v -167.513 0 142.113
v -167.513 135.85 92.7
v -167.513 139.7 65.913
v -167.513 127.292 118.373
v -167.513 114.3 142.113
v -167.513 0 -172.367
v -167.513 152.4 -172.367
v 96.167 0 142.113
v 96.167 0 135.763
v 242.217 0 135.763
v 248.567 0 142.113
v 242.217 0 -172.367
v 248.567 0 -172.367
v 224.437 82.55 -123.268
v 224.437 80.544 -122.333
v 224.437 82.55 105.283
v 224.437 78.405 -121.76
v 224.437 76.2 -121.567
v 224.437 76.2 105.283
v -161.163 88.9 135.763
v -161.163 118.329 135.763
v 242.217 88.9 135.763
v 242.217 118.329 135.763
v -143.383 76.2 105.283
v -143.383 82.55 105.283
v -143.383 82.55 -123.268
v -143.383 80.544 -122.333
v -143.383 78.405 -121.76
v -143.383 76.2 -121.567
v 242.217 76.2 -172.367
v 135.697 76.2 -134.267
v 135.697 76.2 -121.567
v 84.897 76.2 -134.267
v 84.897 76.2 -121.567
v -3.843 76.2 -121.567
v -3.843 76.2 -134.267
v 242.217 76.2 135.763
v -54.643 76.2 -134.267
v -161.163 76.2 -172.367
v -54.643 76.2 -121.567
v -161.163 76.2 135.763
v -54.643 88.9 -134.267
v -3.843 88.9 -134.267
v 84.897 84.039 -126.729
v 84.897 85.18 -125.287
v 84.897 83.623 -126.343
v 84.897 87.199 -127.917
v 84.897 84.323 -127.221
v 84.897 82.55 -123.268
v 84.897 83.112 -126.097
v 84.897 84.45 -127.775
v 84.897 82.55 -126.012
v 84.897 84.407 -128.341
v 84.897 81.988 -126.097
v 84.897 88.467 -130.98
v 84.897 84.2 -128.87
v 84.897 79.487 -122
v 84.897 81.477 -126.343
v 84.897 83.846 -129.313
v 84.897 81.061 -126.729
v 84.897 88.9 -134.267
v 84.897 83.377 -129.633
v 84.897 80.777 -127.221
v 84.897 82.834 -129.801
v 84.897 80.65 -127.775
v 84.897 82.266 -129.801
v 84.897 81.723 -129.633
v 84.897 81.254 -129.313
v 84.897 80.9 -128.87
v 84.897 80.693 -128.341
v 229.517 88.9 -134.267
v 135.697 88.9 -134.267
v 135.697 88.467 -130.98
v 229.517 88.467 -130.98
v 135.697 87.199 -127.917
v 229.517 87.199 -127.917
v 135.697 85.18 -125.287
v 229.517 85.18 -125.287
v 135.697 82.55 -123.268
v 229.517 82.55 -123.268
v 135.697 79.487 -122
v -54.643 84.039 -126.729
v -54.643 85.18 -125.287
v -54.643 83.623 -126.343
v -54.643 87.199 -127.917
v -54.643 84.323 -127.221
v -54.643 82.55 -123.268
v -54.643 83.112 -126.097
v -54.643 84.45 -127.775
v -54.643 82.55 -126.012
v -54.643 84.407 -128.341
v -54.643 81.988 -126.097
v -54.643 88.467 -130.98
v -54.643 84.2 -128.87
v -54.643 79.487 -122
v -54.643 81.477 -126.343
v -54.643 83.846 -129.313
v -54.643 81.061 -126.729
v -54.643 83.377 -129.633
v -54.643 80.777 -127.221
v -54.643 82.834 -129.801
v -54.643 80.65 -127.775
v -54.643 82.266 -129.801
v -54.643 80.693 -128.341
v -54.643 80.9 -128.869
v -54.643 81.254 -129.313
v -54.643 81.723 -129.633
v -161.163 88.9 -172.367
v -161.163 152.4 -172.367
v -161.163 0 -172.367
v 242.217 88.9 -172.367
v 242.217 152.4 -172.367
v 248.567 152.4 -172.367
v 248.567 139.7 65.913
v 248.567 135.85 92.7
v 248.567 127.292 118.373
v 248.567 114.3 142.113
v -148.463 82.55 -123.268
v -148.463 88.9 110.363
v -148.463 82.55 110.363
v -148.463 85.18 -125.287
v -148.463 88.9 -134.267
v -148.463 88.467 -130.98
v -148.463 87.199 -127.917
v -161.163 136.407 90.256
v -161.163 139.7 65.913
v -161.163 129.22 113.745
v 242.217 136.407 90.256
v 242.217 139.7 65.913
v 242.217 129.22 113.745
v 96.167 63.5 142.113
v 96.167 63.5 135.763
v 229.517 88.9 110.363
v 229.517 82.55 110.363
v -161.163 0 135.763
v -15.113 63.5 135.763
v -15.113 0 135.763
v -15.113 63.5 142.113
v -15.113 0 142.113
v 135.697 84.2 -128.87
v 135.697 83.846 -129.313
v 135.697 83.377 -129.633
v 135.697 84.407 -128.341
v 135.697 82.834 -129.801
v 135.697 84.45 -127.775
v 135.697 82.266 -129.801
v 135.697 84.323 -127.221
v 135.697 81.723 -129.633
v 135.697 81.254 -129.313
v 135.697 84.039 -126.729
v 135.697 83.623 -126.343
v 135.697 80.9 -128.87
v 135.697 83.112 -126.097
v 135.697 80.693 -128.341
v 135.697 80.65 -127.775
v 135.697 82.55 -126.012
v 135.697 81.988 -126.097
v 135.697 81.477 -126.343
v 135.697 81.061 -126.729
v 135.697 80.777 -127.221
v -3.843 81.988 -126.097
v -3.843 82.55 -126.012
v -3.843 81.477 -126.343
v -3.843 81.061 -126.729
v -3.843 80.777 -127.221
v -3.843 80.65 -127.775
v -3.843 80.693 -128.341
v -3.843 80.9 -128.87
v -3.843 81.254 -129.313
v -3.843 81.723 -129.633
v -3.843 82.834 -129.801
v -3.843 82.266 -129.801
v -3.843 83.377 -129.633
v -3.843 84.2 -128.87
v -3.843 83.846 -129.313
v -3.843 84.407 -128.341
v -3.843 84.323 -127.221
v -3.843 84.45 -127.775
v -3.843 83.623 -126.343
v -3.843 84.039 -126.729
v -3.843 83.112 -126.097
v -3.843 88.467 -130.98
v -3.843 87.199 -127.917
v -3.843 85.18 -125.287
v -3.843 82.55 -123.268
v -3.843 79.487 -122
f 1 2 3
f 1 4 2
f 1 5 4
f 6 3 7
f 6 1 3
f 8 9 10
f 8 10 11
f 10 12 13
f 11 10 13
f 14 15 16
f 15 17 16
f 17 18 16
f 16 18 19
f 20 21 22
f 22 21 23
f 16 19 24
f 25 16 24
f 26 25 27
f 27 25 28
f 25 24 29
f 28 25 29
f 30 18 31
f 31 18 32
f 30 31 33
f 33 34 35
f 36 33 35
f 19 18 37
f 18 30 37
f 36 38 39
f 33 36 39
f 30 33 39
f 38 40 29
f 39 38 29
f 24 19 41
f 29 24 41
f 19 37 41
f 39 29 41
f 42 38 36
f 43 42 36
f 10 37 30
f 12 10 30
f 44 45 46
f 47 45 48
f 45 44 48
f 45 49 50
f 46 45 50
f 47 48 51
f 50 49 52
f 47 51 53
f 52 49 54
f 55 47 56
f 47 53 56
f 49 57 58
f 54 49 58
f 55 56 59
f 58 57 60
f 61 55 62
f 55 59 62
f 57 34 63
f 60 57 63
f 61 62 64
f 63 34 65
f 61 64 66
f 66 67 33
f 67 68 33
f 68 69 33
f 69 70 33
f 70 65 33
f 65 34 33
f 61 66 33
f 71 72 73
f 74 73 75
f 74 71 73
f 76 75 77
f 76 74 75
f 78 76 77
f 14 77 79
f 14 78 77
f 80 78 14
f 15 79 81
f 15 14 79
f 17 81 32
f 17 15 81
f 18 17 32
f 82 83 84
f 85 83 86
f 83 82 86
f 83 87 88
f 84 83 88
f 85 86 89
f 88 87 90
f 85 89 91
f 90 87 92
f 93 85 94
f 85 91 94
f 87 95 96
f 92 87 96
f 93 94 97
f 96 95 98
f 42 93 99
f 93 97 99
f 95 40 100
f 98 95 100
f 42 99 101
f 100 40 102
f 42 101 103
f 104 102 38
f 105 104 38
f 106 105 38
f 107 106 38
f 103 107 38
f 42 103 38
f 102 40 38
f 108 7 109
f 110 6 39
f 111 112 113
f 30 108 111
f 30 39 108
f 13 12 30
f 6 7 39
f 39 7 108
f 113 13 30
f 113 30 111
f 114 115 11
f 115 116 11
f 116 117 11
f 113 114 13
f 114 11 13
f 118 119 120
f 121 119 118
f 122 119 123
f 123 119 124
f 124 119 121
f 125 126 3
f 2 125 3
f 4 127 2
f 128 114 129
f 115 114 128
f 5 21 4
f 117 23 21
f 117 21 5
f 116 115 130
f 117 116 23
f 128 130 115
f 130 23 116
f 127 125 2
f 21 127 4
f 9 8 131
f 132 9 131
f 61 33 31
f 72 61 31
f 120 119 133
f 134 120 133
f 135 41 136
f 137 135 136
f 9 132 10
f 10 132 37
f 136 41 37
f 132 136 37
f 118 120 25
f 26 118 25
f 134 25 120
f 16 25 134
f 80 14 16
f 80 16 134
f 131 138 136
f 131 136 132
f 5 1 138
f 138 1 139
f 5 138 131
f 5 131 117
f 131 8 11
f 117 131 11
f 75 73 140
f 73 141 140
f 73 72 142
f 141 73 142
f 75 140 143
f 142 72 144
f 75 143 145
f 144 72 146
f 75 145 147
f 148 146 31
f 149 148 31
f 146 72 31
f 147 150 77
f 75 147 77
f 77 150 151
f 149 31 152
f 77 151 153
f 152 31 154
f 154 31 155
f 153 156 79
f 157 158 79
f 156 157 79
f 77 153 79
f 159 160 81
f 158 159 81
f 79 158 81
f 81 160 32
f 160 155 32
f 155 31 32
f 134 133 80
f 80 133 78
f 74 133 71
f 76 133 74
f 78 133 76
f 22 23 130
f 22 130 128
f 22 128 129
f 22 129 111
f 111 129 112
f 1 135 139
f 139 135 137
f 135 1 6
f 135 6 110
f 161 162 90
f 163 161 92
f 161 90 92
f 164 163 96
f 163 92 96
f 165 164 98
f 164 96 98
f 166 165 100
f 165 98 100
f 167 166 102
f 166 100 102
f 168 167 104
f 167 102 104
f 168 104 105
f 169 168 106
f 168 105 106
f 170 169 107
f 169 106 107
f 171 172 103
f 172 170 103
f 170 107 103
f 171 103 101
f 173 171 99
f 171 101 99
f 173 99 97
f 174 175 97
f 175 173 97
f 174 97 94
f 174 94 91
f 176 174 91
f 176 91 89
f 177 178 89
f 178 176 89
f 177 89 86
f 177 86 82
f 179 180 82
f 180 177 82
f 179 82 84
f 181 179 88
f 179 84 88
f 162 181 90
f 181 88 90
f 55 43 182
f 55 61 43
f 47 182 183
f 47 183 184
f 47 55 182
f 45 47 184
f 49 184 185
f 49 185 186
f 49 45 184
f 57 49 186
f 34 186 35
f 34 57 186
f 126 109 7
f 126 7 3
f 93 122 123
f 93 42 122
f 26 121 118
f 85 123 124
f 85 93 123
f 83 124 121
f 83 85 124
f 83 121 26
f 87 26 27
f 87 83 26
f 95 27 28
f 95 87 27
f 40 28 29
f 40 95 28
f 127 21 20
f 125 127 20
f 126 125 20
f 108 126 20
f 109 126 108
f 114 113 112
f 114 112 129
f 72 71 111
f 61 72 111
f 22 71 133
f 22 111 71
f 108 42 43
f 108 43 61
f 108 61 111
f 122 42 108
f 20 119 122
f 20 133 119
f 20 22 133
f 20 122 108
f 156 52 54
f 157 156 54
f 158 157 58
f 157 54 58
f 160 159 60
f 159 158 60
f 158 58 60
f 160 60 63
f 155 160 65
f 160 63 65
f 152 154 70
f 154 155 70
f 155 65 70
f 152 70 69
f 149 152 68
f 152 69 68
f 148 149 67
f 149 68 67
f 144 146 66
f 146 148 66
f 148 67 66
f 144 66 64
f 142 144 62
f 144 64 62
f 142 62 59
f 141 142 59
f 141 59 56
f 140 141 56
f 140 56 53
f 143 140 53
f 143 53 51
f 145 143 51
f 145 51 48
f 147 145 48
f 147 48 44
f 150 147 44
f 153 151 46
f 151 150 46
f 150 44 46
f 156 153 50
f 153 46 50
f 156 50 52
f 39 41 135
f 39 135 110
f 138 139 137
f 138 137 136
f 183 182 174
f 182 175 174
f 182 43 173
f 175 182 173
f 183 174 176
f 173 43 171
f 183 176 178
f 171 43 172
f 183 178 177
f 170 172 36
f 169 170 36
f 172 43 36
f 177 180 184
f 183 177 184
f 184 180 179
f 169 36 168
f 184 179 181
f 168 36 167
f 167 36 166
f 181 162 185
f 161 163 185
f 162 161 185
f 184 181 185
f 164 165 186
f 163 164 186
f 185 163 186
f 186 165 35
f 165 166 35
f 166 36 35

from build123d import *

# Parameters (mm, degrees)
SKETCH1_W               = 416.08
SKETCH1_H               = 314.48
BOSS_EXTRUDE2_DEPTH     = 152.4
SKETCH2_W               = 403.38
SKETCH2_H               = 308.13
CUT_EXTRUDE1_DEPTH      = 339.705913999
CUT_EXTRUDE2_DEPTH      = 476.456316699
CUT_EXTRUDE3_REACH      = 430.846
SKETCH4_W               = 111.28
SKETCH4_H               = 63.5
SKETCH5_W               = 403.38
SKETCH5_H               = 12.7
BOSS_EXTRUDE3_DEPTH     = 308.13
SKETCH6_W               = 377.98
SKETCH6_H               = 231.93
CUT_EXTRUDE4_DEPTH      = 6.35
CUT_EXTRUDE5_DEPTH      = 314.544954796
CUT_EXTRUDE5_DEPTH_BACK = 314.544954796
FILLET2_R               = 12.7
BOSS_EXTRUDE4_REACH     = 382.621
SKETCH8_R               = 1.905


with BuildPart() as part:
    # Sketch1 → Boss-Extrude2 (new body)
    with BuildSketch(Plane(origin=(0, 0, 0), x_dir=(1, 0, 0), z_dir=(0, 1, 0))):
        with Locations((40.527, 15.127)):
            Rectangle(SKETCH1_W, SKETCH1_H)
    extrude(amount=BOSS_EXTRUDE2_DEPTH)

    # Sketch2 → Cut-Extrude1 (cut, through all)
    with BuildSketch(Plane(origin=(0, 152.4, 0), x_dir=(1, 0, 0), z_dir=(0, 1, 0))):
        with Locations((40.527, 18.302)):
            Rectangle(SKETCH2_W, SKETCH2_H)
    extrude(amount=-CUT_EXTRUDE1_DEPTH, mode=Mode.SUBTRACT)

    # Sketch3 → Cut-Extrude2 (cut, through all)
    with BuildSketch(Plane(origin=(248.567, 0, 0), x_dir=(0, 0, -1), z_dir=(1, 0, 0))):
        with BuildLine():
            Line((-142.113, 114.3), (-142.113, 152.4))
            Line((-142.113, 152.4), (172.367, 152.4))
            Line((172.367, 152.4), (-65.913, 139.7))
            ThreePointArc((-65.913, 139.7), (-105.728307199, 132.145921598), (-142.113, 114.3))
        make_face()
    extrude(amount=-CUT_EXTRUDE2_DEPTH, mode=Mode.SUBTRACT)

    # Sketch4 → Cut-Extrude3 (cut, up to next)
    with BuildSketch(Plane.XY.offset(142.113), mode=Mode.PRIVATE) as cut_extrude3_sk1:
        with Locations((40.527, 31.75)):
            Rectangle(SKETCH4_W, SKETCH4_H)
    cut_extrude3_tool1 = extrude(cut_extrude3_sk1.sketch, amount=-CUT_EXTRUDE3_REACH, mode=Mode.PRIVATE) & part.part
    add(cut_extrude3_tool1.solids().sort_by_distance((40.527, 31.75, 142.113))[0], mode=Mode.SUBTRACT)

    # Sketch5 → Boss-Extrude3 (add)
    with BuildSketch(Plane(origin=(0, 0, 135.763), x_dir=(-1, 0, 0), z_dir=(0, 0, -1))):
        with Locations((-40.527, 82.55)):
            Rectangle(SKETCH5_W, SKETCH5_H)
    extrude(amount=BOSS_EXTRUDE3_DEPTH)

    # Sketch6 → Cut-Extrude4 (cut)
    with BuildSketch(Plane(origin=(0, 88.9, 0), x_dir=(1, 0, 0), z_dir=(0, 1, 0))):
        with Locations((40.527, 5.602)):
            Rectangle(SKETCH6_W, SKETCH6_H)
    extrude(amount=-CUT_EXTRUDE4_DEPTH, mode=Mode.SUBTRACT)

    # Sketch7 → Cut-Extrude5 (cut, two sides: drawn at the far end of the back side and taken through both)
    with BuildSketch(Plane(origin=(0, 82.55, 0), x_dir=(1, 0, 0), z_dir=(0, 1, 0)).offset(-CUT_EXTRUDE5_DEPTH_BACK)):
        Polygon((-54.643, 134.267), (-3.843, 134.267), (-3.843, 121.567), (84.897, 121.567), (84.897, 134.267), (135.697, 134.267), (135.697, 121.567), (224.437, 121.567), (224.437, -105.283), (-143.383, -105.283), (-143.383, 121.567), (-54.643, 121.567), align=None)
    extrude(amount=CUT_EXTRUDE5_DEPTH + CUT_EXTRUDE5_DEPTH_BACK, mode=Mode.SUBTRACT)

    # Fillet2
    fillet2_edges = [part.edges().sort_by_distance(p)[0] for p in [
        (182.607, 88.9, -121.567),
        (40.527, 88.9, -121.567),
        (-101.553, 88.9, -121.567),
    ]]
    fillet(fillet2_edges, radius=FILLET2_R - 0.0001)  # a hair under: the kernel refuses the full size

    # Boss-Extrude4: up to this face of the body (flat: up to its plane)
    boss_extrude4_end = Plane(part.part.faces().sort_by_distance((135.697, 81.590060551, -128.876939449))[0])
    # Sketch8 → Boss-Extrude4 (add, up to the picked face)
    with BuildSketch(Plane(origin=(-54.643, 0, 0), x_dir=(0, 0, -1), z_dir=(1, 0, 0)), mode=Mode.PRIVATE) as boss_extrude4_sk1:
        with Locations(Location((127.917, 82.55, 0), (0, 0, 180))):
            Circle(SKETCH8_R)
    boss_extrude4_tool1 = split(extrude(boss_extrude4_sk1.sketch, amount=BOSS_EXTRUDE4_REACH, mode=Mode.PRIVATE), bisect_by=boss_extrude4_end, keep=Keep.BOTH, mode=Mode.PRIVATE)
    add(boss_extrude4_tool1.solids().sort_by(Axis((-54.643, 82.55, -127.917), (1, 0, 0)))[0])


solid = part.part
